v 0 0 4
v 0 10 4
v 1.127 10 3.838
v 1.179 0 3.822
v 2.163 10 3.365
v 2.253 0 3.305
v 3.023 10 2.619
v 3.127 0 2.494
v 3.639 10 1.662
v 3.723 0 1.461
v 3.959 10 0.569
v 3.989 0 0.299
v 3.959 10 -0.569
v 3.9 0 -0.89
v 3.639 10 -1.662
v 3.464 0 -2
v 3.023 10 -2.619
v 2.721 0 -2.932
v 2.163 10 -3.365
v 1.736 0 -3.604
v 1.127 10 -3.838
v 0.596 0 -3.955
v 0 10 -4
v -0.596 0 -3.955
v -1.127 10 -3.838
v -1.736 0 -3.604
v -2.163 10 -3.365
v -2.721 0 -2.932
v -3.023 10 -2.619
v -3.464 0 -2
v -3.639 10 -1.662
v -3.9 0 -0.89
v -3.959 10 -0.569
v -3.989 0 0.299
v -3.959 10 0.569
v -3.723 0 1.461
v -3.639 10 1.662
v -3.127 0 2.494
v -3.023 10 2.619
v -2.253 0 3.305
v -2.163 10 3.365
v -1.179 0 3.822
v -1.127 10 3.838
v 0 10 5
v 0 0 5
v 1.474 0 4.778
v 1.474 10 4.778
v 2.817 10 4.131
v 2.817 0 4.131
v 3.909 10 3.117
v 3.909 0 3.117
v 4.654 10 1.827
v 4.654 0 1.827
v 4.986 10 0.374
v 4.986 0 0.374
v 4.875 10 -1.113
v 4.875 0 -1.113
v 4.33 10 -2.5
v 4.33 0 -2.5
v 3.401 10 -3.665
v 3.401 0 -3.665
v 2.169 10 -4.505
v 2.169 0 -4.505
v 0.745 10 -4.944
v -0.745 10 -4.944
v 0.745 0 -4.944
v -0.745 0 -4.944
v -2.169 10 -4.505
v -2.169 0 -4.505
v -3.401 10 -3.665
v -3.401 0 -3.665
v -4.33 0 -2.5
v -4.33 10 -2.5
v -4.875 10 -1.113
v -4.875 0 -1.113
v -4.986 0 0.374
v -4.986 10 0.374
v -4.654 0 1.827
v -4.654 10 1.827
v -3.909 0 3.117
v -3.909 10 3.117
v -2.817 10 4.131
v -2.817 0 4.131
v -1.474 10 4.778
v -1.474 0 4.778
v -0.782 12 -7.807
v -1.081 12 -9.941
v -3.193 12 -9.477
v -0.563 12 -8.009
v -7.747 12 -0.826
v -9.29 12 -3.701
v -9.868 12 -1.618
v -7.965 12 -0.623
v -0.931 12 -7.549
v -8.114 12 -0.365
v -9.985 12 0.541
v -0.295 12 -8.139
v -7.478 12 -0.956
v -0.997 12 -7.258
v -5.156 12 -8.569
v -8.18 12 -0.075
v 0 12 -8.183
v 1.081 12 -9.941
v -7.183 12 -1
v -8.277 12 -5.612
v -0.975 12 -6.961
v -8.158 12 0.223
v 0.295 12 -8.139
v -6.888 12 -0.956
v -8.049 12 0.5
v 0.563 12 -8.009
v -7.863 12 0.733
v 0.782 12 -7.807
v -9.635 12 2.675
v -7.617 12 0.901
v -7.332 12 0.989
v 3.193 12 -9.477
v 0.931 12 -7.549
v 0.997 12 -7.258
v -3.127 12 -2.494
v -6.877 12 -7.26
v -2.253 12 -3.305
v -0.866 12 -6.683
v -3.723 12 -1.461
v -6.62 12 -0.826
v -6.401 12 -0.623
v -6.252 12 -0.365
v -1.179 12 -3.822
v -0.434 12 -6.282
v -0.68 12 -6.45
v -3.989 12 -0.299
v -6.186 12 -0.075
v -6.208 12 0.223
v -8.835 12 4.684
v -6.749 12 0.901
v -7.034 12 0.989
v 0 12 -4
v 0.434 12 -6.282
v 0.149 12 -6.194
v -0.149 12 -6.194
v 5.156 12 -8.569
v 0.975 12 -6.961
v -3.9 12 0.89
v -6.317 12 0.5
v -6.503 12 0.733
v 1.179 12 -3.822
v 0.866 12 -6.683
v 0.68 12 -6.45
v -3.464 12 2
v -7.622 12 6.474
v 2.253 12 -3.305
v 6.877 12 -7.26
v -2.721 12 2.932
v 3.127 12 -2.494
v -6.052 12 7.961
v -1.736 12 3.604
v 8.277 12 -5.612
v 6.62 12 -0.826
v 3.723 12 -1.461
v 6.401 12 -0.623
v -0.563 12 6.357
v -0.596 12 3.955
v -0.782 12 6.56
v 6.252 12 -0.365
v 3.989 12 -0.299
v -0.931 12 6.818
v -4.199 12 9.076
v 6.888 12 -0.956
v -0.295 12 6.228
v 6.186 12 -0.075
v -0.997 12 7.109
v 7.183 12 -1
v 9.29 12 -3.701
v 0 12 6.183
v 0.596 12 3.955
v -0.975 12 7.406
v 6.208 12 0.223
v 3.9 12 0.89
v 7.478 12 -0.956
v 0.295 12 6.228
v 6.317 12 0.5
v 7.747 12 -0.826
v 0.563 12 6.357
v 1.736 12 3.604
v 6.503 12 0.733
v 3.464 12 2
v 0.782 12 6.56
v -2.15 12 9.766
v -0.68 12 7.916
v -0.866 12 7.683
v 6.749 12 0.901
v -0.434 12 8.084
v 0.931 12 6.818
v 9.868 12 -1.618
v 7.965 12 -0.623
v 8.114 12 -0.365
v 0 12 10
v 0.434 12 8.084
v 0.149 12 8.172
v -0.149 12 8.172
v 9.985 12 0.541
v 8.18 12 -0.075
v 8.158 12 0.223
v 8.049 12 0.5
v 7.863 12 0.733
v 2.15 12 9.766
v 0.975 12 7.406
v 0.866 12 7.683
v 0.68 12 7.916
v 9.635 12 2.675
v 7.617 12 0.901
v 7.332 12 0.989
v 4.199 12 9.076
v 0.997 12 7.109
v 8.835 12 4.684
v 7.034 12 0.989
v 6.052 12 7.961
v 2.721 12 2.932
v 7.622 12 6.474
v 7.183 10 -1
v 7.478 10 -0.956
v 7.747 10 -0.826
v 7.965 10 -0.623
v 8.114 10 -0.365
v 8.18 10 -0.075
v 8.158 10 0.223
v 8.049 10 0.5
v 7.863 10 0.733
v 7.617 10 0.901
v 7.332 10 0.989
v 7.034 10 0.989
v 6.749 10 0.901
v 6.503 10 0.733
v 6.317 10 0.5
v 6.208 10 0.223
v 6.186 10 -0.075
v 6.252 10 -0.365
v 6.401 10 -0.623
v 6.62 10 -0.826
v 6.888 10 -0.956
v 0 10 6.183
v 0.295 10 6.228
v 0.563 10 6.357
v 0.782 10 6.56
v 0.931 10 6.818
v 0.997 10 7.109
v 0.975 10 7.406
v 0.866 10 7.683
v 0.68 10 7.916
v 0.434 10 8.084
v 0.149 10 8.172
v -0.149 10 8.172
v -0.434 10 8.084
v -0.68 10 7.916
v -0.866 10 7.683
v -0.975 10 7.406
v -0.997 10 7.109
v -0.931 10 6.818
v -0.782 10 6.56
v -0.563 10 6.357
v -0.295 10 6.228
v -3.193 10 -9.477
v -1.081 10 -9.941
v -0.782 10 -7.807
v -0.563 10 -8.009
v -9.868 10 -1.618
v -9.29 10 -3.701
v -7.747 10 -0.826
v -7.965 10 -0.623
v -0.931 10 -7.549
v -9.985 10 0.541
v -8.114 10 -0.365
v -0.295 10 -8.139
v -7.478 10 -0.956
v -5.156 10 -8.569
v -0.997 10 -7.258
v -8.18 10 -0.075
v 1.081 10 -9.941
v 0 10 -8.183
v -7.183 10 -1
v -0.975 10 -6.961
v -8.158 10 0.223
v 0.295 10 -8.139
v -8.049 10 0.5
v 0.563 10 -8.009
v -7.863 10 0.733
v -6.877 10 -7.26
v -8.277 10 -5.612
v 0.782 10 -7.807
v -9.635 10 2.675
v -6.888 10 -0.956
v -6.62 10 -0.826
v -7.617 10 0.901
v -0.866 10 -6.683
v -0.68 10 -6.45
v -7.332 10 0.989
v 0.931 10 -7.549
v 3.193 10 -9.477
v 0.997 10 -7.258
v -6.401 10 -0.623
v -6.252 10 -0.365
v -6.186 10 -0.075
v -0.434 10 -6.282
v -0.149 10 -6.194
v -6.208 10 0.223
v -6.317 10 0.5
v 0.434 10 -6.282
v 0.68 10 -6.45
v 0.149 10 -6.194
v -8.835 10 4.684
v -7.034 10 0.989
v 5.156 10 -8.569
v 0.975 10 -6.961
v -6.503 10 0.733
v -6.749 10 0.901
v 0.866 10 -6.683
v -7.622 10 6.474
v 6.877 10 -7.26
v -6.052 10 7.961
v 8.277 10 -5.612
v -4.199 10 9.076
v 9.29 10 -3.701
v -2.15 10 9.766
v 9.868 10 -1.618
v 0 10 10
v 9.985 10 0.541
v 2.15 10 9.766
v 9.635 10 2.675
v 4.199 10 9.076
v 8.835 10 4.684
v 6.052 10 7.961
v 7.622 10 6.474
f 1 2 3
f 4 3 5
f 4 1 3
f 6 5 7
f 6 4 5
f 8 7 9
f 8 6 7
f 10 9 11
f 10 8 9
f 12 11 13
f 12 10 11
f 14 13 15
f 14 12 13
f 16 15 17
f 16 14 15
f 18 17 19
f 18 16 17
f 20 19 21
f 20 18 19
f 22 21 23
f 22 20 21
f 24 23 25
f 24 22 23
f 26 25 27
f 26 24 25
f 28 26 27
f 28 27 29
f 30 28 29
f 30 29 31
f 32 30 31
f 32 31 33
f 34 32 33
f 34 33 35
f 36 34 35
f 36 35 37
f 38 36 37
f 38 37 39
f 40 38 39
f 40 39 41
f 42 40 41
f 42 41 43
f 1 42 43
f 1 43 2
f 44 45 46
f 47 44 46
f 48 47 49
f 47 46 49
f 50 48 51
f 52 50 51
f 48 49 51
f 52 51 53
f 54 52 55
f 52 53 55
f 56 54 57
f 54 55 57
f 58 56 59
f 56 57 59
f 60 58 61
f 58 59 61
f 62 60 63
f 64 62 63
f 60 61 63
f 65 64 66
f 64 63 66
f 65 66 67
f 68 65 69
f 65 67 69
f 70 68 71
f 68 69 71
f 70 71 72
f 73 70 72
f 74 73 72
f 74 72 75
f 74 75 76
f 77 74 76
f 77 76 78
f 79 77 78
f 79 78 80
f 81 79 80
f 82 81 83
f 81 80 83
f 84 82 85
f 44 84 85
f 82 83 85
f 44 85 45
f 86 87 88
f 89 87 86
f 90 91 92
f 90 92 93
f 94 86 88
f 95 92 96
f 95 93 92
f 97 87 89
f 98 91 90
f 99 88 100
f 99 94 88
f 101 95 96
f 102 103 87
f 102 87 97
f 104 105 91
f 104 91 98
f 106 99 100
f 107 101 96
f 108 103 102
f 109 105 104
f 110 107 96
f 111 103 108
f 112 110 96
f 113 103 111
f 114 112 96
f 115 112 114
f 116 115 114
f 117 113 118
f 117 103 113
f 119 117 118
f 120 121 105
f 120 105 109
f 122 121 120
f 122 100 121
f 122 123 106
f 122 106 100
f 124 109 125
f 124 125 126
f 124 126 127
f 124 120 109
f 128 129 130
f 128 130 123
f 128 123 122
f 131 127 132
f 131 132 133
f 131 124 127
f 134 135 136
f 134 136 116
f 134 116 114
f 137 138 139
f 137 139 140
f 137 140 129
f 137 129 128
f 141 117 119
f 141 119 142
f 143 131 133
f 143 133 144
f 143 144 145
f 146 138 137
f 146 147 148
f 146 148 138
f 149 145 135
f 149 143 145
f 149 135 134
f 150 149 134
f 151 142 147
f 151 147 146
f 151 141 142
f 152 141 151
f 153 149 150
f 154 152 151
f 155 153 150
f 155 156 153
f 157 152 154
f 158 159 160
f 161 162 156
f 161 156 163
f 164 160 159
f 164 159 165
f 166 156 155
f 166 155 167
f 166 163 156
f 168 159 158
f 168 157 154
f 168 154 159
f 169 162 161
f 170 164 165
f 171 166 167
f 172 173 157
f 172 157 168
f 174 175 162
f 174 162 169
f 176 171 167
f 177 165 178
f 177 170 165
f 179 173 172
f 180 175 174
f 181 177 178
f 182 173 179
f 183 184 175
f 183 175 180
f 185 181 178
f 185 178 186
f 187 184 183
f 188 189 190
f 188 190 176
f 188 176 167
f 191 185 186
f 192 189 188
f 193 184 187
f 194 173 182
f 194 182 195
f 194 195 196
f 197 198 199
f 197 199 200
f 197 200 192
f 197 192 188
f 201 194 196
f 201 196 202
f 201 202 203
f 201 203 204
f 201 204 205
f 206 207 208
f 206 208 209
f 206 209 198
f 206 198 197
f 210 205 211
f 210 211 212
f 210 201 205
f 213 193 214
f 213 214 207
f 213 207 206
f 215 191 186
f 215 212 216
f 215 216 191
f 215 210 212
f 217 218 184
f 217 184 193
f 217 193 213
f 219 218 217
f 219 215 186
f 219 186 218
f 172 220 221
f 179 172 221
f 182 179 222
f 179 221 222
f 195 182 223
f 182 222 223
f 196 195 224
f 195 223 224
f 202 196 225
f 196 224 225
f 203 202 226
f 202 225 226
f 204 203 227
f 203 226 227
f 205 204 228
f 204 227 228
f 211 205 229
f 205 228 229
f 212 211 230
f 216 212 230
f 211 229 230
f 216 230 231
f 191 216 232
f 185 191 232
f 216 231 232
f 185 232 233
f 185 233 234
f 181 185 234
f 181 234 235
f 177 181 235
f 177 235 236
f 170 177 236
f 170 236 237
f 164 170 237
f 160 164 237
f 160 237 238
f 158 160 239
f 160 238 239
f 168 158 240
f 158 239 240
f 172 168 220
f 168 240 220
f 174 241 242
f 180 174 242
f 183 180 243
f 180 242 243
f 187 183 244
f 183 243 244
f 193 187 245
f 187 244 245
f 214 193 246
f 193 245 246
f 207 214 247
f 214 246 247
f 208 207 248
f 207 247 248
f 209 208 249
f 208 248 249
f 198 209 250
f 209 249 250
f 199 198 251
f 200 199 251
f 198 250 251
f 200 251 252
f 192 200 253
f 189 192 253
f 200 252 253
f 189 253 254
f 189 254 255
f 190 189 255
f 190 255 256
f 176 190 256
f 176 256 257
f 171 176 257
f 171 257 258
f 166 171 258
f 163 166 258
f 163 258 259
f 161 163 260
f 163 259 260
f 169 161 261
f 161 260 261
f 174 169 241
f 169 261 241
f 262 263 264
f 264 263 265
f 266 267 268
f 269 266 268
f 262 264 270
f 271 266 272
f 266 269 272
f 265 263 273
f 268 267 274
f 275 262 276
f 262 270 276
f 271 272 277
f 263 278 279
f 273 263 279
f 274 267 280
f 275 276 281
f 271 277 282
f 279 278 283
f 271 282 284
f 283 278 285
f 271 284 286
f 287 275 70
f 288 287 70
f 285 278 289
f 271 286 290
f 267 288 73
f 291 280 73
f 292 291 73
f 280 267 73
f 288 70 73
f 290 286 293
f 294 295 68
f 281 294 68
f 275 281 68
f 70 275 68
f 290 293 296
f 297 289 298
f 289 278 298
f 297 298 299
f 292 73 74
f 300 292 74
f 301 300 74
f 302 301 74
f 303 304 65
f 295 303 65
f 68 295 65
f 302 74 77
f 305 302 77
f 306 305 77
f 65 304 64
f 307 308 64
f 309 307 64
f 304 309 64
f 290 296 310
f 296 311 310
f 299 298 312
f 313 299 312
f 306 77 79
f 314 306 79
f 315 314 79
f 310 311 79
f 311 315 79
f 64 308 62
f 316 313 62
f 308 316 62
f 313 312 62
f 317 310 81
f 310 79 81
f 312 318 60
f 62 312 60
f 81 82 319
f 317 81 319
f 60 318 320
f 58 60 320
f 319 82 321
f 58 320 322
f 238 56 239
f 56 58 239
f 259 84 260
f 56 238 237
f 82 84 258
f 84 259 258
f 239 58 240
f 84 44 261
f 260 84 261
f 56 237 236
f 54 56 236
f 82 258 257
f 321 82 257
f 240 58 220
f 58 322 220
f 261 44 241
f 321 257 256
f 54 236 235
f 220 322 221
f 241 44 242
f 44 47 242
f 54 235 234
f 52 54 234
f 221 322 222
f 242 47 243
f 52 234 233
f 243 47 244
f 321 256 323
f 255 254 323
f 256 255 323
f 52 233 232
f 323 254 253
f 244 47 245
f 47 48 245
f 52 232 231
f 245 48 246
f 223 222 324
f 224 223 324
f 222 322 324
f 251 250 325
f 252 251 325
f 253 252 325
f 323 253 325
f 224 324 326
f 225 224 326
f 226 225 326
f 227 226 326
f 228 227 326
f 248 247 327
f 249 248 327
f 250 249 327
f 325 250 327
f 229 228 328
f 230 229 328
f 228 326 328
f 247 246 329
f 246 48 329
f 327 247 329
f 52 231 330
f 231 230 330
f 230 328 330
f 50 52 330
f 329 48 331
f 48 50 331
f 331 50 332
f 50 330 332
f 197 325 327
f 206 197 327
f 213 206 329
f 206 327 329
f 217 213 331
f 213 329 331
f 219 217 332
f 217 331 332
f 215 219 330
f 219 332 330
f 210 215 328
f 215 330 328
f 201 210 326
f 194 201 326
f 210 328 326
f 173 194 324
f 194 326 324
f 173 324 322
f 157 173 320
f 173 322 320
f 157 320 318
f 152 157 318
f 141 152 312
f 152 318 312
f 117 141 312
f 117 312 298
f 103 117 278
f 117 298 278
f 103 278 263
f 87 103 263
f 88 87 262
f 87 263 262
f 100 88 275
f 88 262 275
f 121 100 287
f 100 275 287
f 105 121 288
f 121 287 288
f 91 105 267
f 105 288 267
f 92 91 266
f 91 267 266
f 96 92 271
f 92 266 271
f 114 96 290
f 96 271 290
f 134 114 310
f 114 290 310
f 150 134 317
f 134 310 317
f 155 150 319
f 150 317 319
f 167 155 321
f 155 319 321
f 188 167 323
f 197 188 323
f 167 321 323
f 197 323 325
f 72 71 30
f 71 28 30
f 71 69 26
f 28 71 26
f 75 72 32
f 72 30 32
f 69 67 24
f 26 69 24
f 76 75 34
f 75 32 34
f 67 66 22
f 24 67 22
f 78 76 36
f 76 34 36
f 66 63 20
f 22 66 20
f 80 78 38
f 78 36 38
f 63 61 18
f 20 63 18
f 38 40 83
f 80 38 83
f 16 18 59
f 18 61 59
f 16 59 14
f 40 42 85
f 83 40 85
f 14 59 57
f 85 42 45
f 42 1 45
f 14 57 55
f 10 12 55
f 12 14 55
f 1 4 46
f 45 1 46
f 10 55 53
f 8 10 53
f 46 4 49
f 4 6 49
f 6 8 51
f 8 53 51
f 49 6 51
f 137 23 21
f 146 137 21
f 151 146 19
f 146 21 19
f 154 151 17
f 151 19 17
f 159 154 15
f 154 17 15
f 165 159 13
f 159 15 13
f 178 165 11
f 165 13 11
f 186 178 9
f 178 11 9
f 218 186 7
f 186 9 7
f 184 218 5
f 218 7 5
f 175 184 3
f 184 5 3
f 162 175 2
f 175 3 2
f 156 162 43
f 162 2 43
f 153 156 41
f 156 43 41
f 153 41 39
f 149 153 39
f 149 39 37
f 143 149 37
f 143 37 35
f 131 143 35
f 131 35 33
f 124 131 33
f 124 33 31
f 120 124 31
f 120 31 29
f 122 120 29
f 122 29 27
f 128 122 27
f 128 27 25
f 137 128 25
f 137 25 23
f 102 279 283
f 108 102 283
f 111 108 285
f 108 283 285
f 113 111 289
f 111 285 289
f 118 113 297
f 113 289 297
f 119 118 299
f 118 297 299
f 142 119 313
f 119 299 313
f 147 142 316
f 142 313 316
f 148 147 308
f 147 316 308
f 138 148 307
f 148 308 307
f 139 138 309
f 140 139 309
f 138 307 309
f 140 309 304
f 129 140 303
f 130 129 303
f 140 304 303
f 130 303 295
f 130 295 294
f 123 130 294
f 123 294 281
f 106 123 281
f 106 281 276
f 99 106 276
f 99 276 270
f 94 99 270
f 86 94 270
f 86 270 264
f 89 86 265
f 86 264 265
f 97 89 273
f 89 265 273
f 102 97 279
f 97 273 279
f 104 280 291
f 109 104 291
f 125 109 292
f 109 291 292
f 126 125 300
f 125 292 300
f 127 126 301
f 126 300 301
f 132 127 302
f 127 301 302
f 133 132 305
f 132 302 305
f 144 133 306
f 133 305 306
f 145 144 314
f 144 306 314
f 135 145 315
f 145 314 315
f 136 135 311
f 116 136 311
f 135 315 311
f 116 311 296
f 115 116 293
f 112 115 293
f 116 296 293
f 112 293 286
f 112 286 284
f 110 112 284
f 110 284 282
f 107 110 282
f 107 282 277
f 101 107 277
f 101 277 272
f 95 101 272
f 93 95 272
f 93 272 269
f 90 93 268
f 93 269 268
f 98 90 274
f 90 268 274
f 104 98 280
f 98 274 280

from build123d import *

# Parameters (mm, degrees)
SKETCH1_R           = 5
SKETCH1_R_2         = 4
BOSS_EXTRUDE1_DEPTH = 10
SKETCH2_R           = 10
BOSS_EXTRUDE2_DEPTH = 2
SKETCH3_R           = 1
CUT_EXTRUDE1_DEPTH  = 2
SKETCH4_R           = 4
CUT_EXTRUDE2_DEPTH  = 2


with BuildPart() as part:
    # Sketch1 → Boss-Extrude1 (new body)
    with BuildSketch(Plane(origin=(0, 0, 0), x_dir=(1, 0, 0), z_dir=(0, 1, 0))):
        with Locations(Location((0, 0, 0), (0, 0, 270))):
            Circle(SKETCH1_R)
        with Locations(Location((0, 0, 0), (0, 0, 270))):
            Circle(SKETCH1_R_2, mode=Mode.SUBTRACT)
    extrude(amount=BOSS_EXTRUDE1_DEPTH)

    # Sketch2 → Boss-Extrude2 (add)
    with BuildSketch(Plane(origin=(0, 10, 0), x_dir=(1, 0, 0), z_dir=(0, 1, 0))):
        with Locations(Location((0, 0, 0), (0, 0, 270))):
            Circle(SKETCH2_R)
    extrude(amount=BOSS_EXTRUDE2_DEPTH)

    # Sketch3 → Cut-Extrude1 (cut)
    with BuildSketch(Plane(origin=(0, 10, 0), x_dir=(-1, 0, 0), z_dir=(0, -1, 0))):
        with Locations(Location((-7.183252609, 0, 0), (0, 0, 90))):
            Circle(SKETCH3_R)
        with Locations(Location((0, 7.183252609, 0), (0, 0, 90))):
            Circle(SKETCH3_R)
        with Locations(Location((7.183252609, 0, 0), (0, 0, 90))):
            Circle(SKETCH3_R)
        with Locations(Location((0, -7.183252609, 0), (0, 0, 90))):
            Circle(SKETCH3_R)
    extrude(amount=-CUT_EXTRUDE1_DEPTH, mode=Mode.SUBTRACT)

    # Sketch4 → Cut-Extrude2 (cut)
    with BuildSketch(Plane(origin=(0, 10, 0), x_dir=(-1, 0, 0), z_dir=(0, -1, 0))):
        with Locations(Location((0, 0, 0), (0, 0, 90))):
            Circle(SKETCH4_R)
    extrude(amount=-CUT_EXTRUDE2_DEPTH, mode=Mode.SUBTRACT)


solid = part.part
